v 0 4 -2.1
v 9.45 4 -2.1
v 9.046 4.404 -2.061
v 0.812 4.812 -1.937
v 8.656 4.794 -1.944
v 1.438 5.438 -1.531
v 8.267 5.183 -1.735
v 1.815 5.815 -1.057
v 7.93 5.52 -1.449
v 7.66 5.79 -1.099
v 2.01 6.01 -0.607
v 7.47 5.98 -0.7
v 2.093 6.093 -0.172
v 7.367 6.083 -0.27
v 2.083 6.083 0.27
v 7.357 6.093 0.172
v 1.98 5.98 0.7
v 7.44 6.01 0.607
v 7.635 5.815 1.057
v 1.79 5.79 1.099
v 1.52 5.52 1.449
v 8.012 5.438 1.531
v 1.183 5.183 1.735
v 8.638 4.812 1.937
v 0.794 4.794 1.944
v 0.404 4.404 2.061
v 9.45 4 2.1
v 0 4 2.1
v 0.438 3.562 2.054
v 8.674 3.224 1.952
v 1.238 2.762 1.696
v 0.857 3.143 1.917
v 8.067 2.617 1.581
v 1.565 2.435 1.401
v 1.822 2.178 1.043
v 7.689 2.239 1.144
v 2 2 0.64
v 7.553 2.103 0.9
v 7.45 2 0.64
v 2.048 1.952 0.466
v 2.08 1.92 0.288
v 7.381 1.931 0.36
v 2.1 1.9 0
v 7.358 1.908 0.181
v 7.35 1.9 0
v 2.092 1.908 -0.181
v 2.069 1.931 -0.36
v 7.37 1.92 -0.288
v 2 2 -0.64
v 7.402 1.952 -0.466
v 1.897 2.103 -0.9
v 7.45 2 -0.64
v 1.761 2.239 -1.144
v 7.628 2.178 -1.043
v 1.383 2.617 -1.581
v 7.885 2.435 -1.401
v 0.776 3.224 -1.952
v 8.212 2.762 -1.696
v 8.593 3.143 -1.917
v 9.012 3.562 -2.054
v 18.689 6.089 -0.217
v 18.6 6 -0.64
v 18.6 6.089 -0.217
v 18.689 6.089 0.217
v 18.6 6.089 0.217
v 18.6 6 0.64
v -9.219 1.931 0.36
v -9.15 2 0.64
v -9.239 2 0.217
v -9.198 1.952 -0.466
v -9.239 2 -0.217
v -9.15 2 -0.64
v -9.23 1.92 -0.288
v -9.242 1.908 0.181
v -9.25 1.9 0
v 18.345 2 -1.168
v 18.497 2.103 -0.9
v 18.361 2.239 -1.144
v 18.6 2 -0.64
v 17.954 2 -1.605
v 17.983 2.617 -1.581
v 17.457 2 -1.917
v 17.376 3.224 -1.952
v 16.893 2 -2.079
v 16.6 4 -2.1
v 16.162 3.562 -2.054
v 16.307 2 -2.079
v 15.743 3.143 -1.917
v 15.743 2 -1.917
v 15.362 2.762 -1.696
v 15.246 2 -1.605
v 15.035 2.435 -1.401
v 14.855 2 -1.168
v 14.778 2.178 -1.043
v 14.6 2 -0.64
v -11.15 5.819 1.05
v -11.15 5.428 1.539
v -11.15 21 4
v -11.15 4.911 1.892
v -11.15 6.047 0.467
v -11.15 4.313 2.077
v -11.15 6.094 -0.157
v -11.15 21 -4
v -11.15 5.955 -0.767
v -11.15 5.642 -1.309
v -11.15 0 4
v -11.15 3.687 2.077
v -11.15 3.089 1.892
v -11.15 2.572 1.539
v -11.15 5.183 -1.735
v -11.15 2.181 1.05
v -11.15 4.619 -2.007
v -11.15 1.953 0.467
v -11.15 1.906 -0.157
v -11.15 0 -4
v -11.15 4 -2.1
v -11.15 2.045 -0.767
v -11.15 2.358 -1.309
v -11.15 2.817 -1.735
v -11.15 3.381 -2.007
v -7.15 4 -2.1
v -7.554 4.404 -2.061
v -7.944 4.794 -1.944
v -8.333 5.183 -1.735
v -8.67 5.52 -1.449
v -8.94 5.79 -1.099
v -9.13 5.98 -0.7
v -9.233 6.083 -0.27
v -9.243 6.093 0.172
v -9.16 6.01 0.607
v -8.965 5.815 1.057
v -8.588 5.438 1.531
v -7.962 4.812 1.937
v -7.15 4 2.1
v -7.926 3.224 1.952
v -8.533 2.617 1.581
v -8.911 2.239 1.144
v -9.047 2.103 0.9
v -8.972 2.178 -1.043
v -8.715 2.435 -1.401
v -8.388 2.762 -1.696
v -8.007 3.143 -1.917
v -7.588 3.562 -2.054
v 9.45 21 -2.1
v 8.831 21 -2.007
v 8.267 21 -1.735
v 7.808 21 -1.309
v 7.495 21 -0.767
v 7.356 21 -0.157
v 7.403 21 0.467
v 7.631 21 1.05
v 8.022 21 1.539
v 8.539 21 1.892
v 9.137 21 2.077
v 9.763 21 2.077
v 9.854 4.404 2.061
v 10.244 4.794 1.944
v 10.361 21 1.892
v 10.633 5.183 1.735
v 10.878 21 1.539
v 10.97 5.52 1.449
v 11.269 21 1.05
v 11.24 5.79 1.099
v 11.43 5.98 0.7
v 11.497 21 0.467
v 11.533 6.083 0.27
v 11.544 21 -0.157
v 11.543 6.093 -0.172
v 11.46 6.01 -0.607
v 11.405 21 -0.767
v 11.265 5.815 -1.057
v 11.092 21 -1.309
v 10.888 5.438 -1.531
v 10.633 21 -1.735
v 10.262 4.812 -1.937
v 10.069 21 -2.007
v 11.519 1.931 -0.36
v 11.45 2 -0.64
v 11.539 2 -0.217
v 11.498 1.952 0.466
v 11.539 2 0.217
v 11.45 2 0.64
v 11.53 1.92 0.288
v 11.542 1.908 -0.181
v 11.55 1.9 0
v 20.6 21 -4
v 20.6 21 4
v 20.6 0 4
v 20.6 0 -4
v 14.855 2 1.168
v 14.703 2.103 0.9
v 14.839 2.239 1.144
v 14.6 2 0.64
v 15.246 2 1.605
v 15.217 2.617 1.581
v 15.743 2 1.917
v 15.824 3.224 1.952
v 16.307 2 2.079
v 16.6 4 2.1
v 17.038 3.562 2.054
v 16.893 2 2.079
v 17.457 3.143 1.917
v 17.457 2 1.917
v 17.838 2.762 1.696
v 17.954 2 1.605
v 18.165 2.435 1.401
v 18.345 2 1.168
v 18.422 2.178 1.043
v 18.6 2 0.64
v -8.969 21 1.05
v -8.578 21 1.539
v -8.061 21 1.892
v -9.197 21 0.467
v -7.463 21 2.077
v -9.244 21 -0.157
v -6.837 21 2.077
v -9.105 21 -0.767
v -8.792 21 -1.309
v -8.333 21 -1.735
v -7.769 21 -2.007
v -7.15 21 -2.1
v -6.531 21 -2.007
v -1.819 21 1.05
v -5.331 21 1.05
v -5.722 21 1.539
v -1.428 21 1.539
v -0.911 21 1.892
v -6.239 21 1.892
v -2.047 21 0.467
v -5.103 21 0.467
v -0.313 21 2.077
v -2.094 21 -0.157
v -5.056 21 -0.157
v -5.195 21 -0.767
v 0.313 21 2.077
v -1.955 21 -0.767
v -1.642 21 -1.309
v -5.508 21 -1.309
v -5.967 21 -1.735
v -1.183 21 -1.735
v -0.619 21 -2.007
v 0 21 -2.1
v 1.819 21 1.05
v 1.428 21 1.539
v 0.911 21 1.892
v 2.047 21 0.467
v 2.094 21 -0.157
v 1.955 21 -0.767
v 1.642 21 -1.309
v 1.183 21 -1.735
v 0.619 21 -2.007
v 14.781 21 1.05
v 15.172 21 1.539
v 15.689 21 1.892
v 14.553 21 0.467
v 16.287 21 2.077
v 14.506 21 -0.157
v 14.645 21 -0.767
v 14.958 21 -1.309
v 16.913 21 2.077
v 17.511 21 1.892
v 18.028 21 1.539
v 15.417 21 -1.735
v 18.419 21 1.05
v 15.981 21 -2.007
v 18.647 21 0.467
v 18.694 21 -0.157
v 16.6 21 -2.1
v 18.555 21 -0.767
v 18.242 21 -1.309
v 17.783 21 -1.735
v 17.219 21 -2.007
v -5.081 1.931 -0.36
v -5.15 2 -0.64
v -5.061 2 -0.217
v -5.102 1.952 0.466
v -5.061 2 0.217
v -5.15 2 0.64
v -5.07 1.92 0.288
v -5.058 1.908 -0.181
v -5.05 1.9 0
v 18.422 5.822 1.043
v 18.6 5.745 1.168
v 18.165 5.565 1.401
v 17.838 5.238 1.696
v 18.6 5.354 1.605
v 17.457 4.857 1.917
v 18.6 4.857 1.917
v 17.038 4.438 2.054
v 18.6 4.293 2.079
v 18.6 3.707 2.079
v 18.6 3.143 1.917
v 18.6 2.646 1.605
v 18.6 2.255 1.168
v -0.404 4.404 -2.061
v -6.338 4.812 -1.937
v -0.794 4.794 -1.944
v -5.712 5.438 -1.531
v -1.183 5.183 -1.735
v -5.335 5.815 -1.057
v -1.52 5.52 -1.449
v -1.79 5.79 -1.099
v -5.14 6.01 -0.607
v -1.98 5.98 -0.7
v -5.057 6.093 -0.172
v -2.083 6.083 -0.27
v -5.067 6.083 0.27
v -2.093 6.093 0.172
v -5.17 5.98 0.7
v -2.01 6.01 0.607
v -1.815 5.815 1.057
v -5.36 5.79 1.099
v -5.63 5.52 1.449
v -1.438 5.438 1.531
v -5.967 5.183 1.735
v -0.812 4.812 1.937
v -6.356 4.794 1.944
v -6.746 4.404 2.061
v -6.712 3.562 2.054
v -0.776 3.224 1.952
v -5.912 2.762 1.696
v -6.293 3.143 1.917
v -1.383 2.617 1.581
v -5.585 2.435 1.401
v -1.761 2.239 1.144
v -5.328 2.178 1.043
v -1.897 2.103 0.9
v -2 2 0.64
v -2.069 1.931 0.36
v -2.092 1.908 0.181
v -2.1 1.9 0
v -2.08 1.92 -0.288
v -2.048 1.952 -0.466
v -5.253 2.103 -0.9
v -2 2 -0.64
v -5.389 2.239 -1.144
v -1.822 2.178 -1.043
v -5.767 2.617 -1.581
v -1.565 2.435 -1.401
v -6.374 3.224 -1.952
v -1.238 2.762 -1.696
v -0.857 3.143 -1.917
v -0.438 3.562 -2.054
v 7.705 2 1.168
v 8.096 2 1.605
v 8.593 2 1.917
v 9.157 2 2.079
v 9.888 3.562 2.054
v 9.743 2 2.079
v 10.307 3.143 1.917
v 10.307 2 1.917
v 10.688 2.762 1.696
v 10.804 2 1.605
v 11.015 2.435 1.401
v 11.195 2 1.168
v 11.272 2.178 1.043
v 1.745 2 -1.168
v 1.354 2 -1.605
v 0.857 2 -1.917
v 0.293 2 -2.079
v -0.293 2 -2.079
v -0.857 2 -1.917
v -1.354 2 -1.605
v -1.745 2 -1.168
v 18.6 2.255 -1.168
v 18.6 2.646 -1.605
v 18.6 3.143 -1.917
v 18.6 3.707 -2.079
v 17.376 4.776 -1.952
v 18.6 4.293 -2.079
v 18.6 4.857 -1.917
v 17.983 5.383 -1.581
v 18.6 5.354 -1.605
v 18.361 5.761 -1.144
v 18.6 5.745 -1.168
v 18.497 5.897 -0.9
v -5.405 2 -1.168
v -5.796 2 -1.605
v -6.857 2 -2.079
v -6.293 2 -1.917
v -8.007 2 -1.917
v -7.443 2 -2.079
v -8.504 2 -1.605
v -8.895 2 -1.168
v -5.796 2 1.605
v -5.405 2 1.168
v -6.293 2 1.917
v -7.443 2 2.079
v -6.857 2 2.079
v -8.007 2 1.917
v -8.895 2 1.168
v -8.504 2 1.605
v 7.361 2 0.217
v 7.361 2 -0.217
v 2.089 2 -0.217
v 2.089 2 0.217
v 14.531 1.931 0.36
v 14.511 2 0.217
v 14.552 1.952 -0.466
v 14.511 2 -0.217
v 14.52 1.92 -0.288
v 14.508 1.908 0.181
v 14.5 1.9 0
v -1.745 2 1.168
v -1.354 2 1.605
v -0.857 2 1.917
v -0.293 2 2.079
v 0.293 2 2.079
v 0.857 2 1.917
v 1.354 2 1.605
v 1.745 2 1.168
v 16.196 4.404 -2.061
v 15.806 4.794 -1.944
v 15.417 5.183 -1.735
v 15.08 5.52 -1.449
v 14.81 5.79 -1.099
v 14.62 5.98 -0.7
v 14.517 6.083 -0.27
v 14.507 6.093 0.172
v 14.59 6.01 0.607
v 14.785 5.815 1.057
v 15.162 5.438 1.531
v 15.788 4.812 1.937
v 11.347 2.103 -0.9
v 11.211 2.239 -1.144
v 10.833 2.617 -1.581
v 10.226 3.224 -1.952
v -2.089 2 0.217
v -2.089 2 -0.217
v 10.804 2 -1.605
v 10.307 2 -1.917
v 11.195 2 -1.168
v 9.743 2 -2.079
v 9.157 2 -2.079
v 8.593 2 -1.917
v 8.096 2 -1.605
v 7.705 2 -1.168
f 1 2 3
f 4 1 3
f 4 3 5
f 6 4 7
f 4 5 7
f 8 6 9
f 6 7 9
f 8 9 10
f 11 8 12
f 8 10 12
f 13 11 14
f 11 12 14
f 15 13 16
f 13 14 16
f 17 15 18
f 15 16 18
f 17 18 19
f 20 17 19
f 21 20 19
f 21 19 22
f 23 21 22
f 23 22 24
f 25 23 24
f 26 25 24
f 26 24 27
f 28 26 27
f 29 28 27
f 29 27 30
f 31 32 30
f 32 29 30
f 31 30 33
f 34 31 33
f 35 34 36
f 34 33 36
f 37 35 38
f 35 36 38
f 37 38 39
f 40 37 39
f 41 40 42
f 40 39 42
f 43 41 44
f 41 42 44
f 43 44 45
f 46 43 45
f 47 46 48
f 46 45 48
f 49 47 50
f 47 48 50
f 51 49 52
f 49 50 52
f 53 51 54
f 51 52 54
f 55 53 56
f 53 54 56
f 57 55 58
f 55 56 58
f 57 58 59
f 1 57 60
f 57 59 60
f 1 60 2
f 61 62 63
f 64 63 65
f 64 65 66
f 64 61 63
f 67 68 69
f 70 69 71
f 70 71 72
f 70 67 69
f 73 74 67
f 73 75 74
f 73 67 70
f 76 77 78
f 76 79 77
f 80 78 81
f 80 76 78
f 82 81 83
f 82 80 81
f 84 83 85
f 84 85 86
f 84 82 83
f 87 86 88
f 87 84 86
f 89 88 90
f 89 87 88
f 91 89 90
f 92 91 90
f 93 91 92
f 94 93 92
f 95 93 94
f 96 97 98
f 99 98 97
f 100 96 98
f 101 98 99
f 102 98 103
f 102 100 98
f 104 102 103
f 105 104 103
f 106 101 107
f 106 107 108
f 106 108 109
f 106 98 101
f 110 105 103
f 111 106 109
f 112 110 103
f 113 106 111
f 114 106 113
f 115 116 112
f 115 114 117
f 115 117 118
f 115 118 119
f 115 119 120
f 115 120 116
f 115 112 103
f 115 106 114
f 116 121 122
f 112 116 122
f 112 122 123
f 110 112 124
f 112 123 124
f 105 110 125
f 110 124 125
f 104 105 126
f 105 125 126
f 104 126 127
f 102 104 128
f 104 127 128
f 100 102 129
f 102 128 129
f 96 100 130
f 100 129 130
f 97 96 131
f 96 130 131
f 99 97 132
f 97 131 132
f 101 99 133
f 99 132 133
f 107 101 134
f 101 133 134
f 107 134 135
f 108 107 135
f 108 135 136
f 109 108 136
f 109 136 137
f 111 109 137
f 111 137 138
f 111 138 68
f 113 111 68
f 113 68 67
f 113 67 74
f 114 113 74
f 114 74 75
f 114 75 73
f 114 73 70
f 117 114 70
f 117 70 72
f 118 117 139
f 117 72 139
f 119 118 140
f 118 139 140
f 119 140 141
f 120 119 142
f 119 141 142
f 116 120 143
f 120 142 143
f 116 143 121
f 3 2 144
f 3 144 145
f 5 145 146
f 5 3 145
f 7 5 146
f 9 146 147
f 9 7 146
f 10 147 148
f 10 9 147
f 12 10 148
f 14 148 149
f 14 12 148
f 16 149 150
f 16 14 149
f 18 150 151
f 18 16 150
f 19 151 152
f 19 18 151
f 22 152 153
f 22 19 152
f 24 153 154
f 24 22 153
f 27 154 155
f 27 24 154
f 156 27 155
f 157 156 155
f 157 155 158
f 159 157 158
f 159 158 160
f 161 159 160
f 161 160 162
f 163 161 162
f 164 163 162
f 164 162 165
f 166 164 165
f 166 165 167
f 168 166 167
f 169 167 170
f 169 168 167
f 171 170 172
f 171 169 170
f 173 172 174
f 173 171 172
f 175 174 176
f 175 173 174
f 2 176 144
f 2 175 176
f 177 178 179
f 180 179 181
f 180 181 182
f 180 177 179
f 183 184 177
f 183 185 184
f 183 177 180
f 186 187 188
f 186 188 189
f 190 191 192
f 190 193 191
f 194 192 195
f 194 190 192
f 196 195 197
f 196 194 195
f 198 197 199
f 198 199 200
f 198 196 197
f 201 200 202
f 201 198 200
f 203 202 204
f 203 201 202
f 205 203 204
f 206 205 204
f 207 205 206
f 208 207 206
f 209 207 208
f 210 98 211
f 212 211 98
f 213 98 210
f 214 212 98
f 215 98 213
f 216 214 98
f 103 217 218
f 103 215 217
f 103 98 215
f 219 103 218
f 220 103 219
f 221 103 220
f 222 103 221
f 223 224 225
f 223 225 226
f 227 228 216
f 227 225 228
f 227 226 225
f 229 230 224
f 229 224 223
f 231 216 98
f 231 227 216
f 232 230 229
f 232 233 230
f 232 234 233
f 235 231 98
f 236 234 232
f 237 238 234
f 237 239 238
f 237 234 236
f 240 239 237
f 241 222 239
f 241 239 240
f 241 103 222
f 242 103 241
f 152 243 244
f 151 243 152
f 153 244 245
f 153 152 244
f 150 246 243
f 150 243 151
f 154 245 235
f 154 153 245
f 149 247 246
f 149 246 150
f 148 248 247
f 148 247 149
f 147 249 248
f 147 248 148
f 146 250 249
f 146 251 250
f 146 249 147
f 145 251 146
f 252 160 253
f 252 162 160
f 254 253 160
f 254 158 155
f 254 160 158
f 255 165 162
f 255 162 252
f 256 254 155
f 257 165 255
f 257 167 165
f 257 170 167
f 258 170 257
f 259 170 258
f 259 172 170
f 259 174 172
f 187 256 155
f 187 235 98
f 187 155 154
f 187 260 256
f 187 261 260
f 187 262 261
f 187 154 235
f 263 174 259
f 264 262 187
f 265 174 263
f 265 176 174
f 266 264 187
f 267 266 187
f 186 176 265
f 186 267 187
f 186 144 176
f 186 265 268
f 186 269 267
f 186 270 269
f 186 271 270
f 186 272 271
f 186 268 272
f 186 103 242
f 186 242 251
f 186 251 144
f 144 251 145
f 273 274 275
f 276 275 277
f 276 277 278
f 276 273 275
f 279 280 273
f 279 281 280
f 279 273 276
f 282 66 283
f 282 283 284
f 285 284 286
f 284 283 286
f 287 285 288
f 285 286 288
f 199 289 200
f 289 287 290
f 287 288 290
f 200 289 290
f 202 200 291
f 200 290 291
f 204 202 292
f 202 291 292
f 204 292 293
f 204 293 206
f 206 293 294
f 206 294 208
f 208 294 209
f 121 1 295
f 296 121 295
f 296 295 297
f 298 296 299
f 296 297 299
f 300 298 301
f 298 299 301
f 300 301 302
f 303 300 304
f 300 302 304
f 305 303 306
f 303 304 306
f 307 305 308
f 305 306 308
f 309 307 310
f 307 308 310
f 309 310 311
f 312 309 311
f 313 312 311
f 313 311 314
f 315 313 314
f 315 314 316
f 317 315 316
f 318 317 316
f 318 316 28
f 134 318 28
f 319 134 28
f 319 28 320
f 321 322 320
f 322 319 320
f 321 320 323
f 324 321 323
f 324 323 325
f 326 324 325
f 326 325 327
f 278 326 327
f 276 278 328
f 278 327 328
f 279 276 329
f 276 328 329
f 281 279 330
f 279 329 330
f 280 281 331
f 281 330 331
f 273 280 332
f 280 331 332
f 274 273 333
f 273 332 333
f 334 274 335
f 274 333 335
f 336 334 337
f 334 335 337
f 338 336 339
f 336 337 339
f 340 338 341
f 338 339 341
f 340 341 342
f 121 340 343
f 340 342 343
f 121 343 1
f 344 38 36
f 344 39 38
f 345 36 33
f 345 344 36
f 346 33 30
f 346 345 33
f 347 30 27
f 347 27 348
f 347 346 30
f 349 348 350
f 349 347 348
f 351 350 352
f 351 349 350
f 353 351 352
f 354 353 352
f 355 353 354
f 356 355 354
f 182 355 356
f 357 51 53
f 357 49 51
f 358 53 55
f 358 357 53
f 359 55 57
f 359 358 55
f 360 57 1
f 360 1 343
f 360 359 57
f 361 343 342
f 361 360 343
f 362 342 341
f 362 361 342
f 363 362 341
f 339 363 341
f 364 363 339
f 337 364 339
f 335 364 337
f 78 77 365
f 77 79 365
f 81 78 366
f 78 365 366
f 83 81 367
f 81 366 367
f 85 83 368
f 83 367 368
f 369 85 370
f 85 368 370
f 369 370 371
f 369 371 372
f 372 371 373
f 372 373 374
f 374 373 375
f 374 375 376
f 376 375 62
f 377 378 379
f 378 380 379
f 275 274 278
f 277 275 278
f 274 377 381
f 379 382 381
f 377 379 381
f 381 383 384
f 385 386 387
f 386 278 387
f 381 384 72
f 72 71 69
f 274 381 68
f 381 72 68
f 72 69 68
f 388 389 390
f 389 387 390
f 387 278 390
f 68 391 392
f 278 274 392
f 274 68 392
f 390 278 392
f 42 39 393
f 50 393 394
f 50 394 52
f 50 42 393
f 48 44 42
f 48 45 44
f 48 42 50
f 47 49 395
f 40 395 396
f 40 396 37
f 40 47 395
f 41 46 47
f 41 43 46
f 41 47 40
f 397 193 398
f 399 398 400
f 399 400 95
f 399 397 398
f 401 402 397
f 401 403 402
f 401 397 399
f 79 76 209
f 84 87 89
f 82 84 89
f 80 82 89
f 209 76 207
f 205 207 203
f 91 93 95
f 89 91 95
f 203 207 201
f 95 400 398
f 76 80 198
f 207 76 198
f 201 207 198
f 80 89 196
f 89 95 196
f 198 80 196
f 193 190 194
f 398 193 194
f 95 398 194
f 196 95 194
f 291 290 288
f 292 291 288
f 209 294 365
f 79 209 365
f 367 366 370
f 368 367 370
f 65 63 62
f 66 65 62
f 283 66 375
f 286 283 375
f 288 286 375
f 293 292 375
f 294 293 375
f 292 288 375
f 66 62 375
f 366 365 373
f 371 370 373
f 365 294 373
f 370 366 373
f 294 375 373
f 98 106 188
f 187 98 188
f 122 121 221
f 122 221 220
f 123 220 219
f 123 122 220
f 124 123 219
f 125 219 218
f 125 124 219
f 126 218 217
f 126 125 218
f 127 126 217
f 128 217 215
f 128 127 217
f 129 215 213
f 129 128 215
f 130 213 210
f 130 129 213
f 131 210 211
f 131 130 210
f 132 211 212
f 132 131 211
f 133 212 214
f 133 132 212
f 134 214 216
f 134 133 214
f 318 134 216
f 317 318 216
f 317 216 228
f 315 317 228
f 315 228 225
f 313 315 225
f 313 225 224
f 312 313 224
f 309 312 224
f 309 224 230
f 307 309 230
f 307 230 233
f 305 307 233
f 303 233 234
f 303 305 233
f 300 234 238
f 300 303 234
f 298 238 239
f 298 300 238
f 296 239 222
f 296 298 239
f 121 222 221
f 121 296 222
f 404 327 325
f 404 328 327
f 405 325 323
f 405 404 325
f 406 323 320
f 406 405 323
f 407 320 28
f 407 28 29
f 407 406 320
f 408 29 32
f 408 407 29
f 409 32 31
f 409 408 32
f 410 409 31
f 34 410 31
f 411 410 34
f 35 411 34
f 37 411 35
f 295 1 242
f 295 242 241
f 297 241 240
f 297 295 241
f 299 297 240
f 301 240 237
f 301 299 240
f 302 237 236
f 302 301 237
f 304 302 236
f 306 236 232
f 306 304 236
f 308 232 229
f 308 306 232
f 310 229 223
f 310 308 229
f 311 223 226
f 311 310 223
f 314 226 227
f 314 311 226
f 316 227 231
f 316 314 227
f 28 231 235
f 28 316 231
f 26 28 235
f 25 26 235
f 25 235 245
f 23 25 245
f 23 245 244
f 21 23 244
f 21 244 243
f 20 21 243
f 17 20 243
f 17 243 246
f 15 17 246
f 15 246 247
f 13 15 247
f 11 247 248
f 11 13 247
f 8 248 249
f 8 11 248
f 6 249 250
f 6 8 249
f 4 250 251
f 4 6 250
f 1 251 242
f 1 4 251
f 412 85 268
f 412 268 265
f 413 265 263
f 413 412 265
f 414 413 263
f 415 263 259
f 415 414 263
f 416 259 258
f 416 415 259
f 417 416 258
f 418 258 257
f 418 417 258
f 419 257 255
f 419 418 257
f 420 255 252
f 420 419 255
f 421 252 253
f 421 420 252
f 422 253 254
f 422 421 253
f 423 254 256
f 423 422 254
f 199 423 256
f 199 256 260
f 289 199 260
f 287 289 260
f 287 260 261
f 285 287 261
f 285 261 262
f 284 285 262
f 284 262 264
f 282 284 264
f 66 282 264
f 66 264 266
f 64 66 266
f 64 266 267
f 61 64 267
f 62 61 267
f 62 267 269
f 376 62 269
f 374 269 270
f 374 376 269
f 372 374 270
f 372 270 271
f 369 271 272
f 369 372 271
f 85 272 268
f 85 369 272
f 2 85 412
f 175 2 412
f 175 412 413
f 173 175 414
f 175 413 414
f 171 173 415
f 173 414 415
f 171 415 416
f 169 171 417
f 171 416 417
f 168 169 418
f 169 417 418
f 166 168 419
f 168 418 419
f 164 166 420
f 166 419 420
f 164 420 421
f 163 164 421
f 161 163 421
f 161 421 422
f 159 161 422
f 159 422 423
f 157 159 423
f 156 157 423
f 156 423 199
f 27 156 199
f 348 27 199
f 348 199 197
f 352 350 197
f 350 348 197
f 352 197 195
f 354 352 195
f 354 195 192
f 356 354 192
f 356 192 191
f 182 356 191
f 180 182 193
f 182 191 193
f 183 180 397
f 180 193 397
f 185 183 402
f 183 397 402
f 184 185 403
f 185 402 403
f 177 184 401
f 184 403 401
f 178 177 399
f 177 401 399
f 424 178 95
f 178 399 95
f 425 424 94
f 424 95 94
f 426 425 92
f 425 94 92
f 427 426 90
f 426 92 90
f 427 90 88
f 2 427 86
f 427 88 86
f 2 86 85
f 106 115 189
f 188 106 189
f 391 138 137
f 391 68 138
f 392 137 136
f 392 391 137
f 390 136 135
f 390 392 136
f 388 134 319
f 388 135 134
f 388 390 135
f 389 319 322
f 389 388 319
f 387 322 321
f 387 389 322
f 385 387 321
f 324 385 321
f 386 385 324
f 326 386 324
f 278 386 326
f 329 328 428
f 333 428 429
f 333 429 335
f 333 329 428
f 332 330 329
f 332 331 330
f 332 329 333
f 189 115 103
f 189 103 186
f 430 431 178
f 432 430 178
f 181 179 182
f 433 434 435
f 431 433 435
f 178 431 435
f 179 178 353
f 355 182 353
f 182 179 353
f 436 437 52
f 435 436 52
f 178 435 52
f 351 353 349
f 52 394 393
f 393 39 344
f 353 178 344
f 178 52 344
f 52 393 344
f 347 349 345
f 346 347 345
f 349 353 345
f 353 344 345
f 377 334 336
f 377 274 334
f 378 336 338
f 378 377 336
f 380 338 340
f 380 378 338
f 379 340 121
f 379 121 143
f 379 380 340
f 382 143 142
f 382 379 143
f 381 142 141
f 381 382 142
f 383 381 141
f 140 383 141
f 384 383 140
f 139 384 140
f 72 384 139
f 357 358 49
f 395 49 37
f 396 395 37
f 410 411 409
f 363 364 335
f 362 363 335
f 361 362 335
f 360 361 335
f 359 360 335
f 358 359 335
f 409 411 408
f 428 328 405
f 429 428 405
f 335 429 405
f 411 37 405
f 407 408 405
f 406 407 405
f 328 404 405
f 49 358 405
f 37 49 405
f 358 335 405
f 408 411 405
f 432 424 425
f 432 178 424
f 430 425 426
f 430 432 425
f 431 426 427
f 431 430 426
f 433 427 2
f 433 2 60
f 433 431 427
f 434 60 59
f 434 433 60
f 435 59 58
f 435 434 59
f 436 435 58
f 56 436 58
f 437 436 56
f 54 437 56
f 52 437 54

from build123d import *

# Parameters (mm, degrees)
SKETCH1_W           = 31.75
SKETCH1_H           = 8
SKETCH1_R           = 2.1
BOSS_EXTRUDE1_DEPTH = 21
SKETCH4_R           = 2.1
CUT_EXTRUDE3_DEPTH  = 38.5
SKETCH6_R           = 2.1
BOSS_EXTRUDE3_DEPTH = 2
SKETCH7_R           = 2.1
BOSS_EXTRUDE4_DEPTH = 2


with BuildPart() as part:
    # Sketch1 → Boss-Extrude1 (new body)
    with BuildSketch(Plane(origin=(0, 0, 0), x_dir=(1, 0, 0), z_dir=(0, 1, 0))):
        with Locations((4.725, 0)):
            Rectangle(SKETCH1_W, SKETCH1_H)
        with Locations(Location((0, 0, 0), (0, 0, 90))):
            Circle(SKETCH1_R, mode=Mode.SUBTRACT)
        with Locations(Location((-7.15, 0, 0), (0, 0, 90))):
            Circle(SKETCH1_R, mode=Mode.SUBTRACT)
        with Locations(Location((9.45, 0, 0), (0, 0, 90))):
            Circle(SKETCH1_R, mode=Mode.SUBTRACT)
        with Locations(Location((16.6, 0, 0), (0, 0, 90))):
            Circle(SKETCH1_R, mode=Mode.SUBTRACT)
    extrude(amount=BOSS_EXTRUDE1_DEPTH)

    # Sketch4 → Cut-Extrude3 (cut)
    with BuildSketch(Plane(origin=(20.6, 0, 0), x_dir=(0, 0, -1), z_dir=(1, 0, 0))):
        with Locations((0, 4)):
            Circle(SKETCH4_R)
    extrude(amount=-CUT_EXTRUDE3_DEPTH, mode=Mode.SUBTRACT)

    # Sketch6 → Boss-Extrude3 (add)
    with BuildSketch(Plane.XZ):
        with Locations(Location((-7.15, 0, 0), (0, 0, 90))):
            Circle(SKETCH6_R)
        with Locations(Location((0, 0, 0), (0, 0, 90))):
            Circle(SKETCH6_R)
        with Locations(Location((9.45, 0, 0), (0, 0, 90))):
            Circle(SKETCH6_R)
        with Locations(Location((16.6, 0, 0), (0, 0, 90))):
            Circle(SKETCH6_R)
    extrude(amount=-BOSS_EXTRUDE3_DEPTH)

    # Sketch7 → Boss-Extrude4 (add)
    with BuildSketch(Plane(origin=(20.6, 0, 0), x_dir=(0, 0, -1), z_dir=(1, 0, 0))):
        with Locations((0, 4)):
            Circle(SKETCH7_R)
    extrude(amount=-BOSS_EXTRUDE4_DEPTH)


solid = part.part
